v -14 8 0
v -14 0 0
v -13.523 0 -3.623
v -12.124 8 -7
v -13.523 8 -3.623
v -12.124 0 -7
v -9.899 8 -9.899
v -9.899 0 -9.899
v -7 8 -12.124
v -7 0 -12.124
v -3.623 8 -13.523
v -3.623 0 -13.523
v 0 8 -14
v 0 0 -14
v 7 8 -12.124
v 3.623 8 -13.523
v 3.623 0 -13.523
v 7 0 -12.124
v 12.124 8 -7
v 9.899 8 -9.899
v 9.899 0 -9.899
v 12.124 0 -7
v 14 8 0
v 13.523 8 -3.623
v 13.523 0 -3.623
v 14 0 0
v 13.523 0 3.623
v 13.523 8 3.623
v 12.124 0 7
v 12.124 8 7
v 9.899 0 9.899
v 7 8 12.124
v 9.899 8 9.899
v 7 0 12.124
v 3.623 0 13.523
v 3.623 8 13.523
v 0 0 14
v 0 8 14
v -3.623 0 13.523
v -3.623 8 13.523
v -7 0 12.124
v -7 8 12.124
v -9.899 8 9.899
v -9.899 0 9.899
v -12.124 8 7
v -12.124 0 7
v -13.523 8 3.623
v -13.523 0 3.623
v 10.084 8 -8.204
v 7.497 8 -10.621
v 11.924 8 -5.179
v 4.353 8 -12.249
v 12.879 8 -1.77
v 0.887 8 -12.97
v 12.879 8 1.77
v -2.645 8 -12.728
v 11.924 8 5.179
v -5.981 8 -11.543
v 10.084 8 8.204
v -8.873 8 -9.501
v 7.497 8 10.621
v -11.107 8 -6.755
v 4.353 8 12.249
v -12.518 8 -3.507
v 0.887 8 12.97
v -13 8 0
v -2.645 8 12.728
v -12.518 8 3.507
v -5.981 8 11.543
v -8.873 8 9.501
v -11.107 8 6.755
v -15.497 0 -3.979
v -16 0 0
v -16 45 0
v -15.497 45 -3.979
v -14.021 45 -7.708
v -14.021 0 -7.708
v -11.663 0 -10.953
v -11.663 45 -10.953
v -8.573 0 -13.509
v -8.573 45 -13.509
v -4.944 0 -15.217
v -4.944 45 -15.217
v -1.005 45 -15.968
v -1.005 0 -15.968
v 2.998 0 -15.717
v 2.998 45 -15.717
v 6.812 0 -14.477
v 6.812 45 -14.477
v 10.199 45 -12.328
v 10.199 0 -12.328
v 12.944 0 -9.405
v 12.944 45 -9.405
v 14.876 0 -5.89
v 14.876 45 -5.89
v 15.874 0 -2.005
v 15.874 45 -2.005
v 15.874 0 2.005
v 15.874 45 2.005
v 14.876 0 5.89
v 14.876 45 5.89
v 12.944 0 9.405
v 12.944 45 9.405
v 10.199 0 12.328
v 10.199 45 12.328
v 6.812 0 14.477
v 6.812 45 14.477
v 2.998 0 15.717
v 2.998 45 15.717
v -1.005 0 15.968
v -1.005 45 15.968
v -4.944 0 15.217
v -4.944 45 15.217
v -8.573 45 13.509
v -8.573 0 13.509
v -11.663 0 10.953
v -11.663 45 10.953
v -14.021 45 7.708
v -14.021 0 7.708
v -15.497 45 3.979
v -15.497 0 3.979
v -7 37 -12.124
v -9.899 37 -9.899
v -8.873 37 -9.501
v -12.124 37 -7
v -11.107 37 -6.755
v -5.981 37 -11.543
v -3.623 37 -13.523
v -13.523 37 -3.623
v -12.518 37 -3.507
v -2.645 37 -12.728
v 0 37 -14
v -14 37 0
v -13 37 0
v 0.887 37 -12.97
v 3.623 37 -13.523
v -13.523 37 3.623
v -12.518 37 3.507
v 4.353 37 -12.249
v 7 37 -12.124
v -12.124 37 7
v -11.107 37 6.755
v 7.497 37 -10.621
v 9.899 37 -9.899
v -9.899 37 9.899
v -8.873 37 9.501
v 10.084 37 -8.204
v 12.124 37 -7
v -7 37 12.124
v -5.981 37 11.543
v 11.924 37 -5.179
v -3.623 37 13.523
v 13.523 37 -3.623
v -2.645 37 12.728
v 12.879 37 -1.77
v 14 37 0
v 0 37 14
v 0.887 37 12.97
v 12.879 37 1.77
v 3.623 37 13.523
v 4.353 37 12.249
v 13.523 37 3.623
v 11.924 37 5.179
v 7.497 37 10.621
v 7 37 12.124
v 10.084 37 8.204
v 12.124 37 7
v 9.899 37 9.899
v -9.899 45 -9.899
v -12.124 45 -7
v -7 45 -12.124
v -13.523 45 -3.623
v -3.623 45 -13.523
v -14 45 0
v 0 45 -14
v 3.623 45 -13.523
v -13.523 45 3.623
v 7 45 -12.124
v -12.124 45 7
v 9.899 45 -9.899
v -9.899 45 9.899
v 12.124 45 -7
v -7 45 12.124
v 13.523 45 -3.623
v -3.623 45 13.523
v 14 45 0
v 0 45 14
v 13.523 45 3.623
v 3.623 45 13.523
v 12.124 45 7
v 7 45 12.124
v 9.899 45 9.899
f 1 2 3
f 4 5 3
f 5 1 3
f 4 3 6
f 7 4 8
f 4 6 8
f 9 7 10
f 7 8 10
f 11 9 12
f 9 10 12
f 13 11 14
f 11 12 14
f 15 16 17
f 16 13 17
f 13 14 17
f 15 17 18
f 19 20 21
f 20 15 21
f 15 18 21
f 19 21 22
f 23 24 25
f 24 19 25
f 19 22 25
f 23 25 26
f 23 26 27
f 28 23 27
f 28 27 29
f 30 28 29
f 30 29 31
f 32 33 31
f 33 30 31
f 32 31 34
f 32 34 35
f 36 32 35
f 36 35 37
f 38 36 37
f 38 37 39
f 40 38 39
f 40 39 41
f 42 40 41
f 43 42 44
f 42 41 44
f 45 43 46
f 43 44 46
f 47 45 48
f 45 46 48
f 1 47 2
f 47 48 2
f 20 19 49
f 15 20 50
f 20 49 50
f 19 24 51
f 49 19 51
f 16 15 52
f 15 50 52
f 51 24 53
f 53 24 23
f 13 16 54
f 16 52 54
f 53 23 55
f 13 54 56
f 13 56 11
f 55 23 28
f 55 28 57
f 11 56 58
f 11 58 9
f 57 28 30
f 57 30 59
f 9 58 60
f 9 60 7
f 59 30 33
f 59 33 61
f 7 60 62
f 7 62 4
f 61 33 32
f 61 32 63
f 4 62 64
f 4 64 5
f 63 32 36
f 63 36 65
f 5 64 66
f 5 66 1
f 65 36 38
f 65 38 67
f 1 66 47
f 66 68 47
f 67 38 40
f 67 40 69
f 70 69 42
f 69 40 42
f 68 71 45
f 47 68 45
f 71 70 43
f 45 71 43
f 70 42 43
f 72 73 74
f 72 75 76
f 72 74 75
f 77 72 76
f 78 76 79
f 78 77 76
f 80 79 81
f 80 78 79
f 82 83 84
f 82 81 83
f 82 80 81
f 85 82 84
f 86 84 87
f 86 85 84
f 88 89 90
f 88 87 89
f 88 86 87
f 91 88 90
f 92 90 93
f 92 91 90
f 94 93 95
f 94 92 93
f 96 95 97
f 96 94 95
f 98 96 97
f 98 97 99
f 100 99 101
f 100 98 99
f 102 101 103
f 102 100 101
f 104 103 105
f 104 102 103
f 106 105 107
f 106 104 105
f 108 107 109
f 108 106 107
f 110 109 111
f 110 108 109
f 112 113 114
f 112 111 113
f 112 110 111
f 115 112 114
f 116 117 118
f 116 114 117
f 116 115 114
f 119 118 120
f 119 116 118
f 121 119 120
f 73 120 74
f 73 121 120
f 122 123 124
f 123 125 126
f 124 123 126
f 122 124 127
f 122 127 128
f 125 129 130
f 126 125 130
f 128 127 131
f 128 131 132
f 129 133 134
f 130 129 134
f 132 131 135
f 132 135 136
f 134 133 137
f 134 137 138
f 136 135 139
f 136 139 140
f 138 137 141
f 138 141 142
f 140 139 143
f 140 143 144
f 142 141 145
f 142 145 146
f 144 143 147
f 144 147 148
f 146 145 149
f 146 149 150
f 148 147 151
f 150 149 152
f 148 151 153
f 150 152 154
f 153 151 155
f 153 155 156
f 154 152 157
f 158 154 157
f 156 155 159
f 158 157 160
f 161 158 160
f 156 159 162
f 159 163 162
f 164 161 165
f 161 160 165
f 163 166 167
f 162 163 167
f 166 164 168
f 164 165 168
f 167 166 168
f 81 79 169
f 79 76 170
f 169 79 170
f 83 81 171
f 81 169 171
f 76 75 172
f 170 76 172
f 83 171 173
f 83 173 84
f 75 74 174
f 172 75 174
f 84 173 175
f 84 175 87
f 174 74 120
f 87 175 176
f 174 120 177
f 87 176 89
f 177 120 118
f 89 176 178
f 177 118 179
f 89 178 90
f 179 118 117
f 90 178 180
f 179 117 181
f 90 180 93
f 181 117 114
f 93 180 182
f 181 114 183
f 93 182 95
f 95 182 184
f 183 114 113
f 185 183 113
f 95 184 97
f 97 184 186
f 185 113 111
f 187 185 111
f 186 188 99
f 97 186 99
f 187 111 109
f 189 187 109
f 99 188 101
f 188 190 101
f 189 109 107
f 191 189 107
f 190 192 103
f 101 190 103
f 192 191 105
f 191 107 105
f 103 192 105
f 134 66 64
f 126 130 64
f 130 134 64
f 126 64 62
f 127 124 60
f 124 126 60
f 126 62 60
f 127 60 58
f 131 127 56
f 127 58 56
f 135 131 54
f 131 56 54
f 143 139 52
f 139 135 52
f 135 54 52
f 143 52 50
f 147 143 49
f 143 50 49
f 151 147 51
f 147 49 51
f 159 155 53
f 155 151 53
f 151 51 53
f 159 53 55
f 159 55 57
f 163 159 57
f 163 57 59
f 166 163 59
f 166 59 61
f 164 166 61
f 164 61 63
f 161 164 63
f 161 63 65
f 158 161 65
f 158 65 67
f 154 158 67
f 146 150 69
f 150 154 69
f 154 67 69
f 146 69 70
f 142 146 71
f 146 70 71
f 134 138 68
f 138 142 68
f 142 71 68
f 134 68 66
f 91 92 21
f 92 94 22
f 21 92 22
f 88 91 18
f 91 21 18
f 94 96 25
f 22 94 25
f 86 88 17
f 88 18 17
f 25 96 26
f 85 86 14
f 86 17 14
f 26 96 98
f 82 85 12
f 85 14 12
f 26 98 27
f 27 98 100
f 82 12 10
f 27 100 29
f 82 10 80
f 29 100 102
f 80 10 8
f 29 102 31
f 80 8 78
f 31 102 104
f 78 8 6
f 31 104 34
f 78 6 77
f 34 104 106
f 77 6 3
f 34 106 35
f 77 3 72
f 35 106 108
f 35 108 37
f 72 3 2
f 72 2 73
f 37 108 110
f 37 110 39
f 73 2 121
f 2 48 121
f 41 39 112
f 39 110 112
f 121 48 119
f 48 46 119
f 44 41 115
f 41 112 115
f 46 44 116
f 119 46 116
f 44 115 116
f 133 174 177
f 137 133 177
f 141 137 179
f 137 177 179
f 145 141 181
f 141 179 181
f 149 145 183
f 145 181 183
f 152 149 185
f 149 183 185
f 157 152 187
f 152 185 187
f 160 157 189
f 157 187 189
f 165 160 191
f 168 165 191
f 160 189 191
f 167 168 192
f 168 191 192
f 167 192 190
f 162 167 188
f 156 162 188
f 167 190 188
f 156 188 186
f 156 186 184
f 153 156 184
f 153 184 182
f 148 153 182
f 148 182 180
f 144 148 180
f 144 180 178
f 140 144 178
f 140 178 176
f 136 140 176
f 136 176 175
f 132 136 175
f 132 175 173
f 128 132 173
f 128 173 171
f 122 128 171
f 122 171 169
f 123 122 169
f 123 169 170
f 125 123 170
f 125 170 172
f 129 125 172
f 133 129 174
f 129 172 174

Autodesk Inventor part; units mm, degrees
ref_plane "YZ Plane" through (0, 0, 0) normal (1, 0, 0) x (0, 1, 0)
ref_plane "XZ Plane" through (0, 0, 0) normal (0, 1, 0) x (-1, 0, 0)
ref_plane "XY Plane" through (0, 0, 0) normal (0, 0, 1) x (1, 0, 0)
sketch "Sketch1" plane through (0, 0, 0) normal (0, 1, 0) x (-1, 0, 0)
  circle A0 centre (0, 0) radius 14
  circle A1 centre (0, 0) radius 13
  circle A2 centre (0, 0) radius 16
  dimension "d0" = 26
  dimension "d1" = 28
  dimension "d2" = 32
extrude "Extrusion1" add sketch "Sketch1" along normal blind 22.5 contours A0 | A2
extrude "Extrusion2" cut sketch "Sketch1" along normal blind 8 contours A0
mirror "Mirror1" about plane through (0, 22.5, 0) normal (0, 1, 0)
equation "\"d0\" = CsapágyHázBelsőÁtmérő"
equation "\"d1\" = CsapágyKülsőÁtmérő"
equation "\"d2\" = CsapágyHázKülsőÁtmérő"
equation "\"d3\" = 0.5 * CsapágyHázHoszza"
equation "\"d5\" = CsapágySzélesége"
equation "\"ZártSzelvényFalVastagság\" = 1.5"
equation "\"ZártSzelvényBelsőÁtmérő\" = 12"
equation "\"ZártSzelvényKülsőÁtmérő\" = 15"
equation "\"CsapágyBelsőÁtmérő\" = 12"
equation "\"CsapágySzélesége\" = 8"
equation "\"CsapágyKülsőÁtmérő\" = 28"
equation "\"CsapágyHázBelsőÁtmérő\" = 26"
equation "\"CsapágyHázHoszza\" = 45"
equation "\"CsapágyHázKülsőÁtmérő\" = 32"
properties part number "CsapágyHáz" material "Acetal Resin, Black"
